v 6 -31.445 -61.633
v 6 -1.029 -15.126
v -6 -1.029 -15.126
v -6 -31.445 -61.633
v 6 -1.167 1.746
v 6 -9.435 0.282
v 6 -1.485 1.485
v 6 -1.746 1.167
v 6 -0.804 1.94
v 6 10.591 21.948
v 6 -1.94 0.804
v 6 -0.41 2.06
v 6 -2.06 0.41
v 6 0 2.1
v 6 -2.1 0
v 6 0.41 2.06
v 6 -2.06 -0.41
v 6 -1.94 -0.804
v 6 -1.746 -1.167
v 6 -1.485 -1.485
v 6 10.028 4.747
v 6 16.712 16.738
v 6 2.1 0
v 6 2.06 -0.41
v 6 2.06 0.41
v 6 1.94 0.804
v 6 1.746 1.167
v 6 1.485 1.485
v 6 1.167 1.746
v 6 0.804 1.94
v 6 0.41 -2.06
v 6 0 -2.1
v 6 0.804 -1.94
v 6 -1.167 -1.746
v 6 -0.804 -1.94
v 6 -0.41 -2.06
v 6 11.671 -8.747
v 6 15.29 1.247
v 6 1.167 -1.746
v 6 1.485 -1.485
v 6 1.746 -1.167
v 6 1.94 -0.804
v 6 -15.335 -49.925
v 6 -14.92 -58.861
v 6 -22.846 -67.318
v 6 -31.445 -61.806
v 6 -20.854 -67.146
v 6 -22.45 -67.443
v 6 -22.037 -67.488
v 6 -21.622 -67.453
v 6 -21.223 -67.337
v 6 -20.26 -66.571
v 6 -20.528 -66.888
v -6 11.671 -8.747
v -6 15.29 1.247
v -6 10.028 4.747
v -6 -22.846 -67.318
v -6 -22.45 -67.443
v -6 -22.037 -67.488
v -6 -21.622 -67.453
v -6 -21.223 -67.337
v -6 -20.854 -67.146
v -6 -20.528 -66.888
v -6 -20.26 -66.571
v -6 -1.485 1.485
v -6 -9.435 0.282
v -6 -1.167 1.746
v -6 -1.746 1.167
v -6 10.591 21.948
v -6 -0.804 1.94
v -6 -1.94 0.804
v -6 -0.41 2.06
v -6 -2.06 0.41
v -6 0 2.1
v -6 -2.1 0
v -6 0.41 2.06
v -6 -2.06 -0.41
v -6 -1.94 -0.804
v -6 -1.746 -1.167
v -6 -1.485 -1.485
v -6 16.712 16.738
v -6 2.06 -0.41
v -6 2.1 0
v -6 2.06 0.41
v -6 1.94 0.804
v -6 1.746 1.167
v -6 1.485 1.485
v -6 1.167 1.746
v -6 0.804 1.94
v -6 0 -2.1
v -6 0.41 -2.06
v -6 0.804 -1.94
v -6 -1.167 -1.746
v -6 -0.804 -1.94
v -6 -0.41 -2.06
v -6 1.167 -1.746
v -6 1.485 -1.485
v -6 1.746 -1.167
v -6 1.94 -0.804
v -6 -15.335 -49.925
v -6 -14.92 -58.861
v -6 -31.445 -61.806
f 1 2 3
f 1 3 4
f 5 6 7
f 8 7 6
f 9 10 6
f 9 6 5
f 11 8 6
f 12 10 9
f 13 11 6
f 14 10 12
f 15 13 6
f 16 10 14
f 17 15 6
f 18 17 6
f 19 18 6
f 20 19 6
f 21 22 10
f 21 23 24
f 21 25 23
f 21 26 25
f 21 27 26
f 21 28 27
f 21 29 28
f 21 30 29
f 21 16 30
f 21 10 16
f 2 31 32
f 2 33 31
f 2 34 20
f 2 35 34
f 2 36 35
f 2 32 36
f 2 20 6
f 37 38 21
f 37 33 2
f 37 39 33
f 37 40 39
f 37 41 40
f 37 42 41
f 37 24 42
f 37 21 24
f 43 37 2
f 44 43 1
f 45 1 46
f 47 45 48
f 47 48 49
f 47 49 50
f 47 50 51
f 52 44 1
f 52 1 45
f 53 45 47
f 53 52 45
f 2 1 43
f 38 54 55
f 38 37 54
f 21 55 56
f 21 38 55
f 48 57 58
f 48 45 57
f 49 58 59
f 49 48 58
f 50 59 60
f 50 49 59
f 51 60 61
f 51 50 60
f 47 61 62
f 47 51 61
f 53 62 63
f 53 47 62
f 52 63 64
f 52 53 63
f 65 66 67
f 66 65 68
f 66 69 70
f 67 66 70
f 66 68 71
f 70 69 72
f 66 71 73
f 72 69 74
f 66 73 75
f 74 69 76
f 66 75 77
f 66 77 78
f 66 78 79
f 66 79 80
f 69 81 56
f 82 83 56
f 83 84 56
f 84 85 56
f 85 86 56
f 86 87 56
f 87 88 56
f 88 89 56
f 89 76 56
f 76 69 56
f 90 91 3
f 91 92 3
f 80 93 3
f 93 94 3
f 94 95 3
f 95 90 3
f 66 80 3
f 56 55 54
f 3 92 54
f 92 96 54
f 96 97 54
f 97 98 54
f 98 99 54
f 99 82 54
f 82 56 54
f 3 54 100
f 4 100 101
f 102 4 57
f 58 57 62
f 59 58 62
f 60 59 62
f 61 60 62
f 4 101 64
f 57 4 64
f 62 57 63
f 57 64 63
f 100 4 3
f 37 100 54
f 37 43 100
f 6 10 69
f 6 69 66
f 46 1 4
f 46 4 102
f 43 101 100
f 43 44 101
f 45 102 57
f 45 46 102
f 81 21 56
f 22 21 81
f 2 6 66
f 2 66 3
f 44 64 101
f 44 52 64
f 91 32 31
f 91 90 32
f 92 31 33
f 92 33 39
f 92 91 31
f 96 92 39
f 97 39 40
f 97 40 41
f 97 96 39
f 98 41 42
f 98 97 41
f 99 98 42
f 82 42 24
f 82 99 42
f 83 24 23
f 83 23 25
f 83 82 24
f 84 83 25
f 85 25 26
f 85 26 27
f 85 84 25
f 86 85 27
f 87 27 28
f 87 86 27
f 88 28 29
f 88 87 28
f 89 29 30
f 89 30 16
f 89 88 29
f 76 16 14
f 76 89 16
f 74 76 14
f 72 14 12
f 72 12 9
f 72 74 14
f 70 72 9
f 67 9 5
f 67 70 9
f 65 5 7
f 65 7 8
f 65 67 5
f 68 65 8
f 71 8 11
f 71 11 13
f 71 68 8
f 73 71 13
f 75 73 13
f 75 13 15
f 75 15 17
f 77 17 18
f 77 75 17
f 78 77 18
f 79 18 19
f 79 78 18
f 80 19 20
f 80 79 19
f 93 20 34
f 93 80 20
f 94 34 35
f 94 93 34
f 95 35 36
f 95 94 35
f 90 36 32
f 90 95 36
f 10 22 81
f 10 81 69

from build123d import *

# Parameters (mm, degrees)
SKETCH_1_R      = 2.1
EXTRUDE_1_DEPTH = 6


with BuildPart() as part:
    # 스케치1 → 보스-돌출1 (new, symmetric)
    with BuildSketch(Plane(origin=(0, 0, 0), x_dir=(0, 0, -1), z_dir=(1, 0, 0))):
        with BuildLine():
            Line((-1.247311697, 15.290072814), (-4.747158569, 10.027630369))
            Line((-4.747158569, 10.027630369), (-16.737908316, 16.712025722))
            Line((-16.737908316, 16.712025722), (-21.94836762, 10.590510846))
            Line((-21.94836762, 10.590510846), (-0.281769869, -9.435112952))
            Line((-0.281769869, -9.435112952), (15.1257089, -1.028923277))
            Line((15.1257089, -1.028923277), (61.632849993, -31.445174091))
            Line((61.632849993, -31.445174091), (61.80599614, -31.445174091))
            Line((61.80599614, -31.445174091), (67.317930071, -22.846306867))
            ThreePointArc((67.317930071, -22.846306867), (67.40457501, -21.419938181), (66.570574662, -20.259559625))
            Line((66.570574662, -20.259559625), (58.8607522, -14.920439997))
            Line((58.8607522, -14.920439997), (49.925171415, -15.334910855))
            Line((49.925171415, -15.334910855), (8.746820412, 11.671154757))
            Line((8.746820412, 11.671154757), (-1.247311697, 15.290072814))
        make_face()
        Circle(SKETCH_1_R, mode=Mode.SUBTRACT)
    extrude(amount=EXTRUDE_1_DEPTH, both=True)


solid = part.part
